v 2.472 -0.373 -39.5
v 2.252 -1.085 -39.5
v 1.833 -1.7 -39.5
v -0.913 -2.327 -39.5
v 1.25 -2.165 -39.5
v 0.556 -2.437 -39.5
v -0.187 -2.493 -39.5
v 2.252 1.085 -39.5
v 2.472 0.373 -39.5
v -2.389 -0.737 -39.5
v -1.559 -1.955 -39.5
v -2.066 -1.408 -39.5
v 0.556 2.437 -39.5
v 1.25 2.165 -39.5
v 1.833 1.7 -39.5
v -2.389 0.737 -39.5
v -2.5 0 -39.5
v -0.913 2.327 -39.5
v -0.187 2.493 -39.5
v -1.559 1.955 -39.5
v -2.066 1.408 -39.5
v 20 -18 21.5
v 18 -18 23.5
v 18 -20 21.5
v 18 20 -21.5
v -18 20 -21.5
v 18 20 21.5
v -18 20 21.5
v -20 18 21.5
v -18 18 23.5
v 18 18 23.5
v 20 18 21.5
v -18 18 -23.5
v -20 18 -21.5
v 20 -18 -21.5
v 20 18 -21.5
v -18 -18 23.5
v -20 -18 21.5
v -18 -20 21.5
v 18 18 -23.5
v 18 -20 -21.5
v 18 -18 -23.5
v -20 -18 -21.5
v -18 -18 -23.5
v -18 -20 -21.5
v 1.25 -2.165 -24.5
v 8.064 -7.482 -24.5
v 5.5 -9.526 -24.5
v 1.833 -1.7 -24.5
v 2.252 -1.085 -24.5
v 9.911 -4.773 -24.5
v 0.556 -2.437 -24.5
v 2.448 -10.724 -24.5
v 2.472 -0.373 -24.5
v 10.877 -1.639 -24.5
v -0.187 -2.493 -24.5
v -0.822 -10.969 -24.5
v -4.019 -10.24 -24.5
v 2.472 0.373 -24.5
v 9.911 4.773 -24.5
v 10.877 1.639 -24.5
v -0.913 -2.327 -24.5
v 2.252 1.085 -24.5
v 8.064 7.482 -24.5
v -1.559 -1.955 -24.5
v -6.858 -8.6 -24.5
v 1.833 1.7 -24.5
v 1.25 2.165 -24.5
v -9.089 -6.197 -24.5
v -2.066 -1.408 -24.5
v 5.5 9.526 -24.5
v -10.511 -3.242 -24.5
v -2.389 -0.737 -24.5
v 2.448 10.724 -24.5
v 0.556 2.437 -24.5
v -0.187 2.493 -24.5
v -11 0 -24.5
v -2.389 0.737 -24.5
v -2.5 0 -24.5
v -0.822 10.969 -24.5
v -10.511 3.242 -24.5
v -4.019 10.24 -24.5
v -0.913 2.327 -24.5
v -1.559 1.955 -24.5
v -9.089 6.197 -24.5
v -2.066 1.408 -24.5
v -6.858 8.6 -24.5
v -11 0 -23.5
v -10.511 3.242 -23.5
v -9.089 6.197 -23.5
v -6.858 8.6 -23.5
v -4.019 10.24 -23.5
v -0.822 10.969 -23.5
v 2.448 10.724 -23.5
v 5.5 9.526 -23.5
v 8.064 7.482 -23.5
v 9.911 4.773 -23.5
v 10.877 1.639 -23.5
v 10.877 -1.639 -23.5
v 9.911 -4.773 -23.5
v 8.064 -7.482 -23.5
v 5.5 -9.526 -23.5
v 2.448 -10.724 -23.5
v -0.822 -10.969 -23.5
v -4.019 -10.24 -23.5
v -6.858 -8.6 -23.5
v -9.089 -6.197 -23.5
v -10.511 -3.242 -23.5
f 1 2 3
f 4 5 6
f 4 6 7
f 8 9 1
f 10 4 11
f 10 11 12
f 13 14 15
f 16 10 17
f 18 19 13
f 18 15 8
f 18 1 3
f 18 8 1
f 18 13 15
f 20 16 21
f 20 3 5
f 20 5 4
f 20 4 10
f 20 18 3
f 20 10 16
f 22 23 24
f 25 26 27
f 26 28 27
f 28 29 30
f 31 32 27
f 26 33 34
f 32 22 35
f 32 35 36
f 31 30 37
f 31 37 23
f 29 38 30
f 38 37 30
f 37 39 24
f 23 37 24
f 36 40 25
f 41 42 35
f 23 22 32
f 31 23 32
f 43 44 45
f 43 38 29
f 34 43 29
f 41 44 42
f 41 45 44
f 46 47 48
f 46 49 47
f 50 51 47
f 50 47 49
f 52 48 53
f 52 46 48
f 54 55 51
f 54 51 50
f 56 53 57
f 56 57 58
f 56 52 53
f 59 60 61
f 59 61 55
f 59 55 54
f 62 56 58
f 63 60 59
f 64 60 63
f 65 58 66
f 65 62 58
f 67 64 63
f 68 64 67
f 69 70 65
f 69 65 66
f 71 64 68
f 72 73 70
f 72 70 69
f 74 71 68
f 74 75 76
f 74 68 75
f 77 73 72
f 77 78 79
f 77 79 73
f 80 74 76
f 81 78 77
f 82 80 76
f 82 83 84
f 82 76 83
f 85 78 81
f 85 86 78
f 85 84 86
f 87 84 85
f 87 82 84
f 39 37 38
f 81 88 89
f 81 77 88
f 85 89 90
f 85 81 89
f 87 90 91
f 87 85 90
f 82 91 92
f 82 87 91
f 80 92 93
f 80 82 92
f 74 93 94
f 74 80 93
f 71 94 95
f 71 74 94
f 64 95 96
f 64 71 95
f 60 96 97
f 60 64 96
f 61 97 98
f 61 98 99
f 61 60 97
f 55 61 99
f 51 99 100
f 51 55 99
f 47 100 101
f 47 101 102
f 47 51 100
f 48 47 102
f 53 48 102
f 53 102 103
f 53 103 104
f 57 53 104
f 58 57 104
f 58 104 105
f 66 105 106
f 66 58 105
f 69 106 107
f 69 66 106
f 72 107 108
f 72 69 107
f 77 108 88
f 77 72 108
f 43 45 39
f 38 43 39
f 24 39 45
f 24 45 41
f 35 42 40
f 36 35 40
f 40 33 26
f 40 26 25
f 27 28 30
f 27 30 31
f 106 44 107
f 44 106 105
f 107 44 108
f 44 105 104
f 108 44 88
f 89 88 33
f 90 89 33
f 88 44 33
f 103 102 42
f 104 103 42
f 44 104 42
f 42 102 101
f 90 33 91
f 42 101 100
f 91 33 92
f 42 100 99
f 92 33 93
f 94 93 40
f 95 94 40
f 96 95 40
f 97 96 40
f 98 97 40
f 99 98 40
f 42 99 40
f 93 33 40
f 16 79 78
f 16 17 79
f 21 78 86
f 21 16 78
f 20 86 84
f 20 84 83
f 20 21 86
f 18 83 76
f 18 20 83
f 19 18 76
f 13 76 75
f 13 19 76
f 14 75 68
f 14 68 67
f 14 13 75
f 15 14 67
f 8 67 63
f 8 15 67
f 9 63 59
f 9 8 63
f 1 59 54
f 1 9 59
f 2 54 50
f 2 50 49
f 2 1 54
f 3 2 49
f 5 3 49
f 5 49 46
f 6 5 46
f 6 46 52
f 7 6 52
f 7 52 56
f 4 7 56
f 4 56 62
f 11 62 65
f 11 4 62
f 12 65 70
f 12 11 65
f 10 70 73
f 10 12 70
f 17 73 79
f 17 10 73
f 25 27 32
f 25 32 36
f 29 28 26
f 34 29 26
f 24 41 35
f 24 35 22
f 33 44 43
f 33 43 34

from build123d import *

# Parameters (mm, degrees)
SKETCH1_W           = 40
SKETCH1_H           = 40
BOSS_EXTRUDE1_DEPTH = 23.5
CHAMFER1_SIZE       = 2
SKETCH2_R           = 11
BOSS_EXTRUDE2_DEPTH = 1
SKETCH3_R           = 2.5
BOSS_EXTRUDE3_DEPTH = 15


with BuildPart() as part:
    # Sketch1 → Boss-Extrude1 (new body, symmetric)
    with BuildSketch(Plane.XY):
        Rectangle(SKETCH1_W, SKETCH1_H)
    extrude(amount=BOSS_EXTRUDE1_DEPTH, both=True)

    # Chamfer1
    chamfer1_edges = [part.edges().sort_by_distance(p)[0] for p in [
        (-20, 0, 23.5),
        (0, -20, 23.5),
        (20, 0, 23.5),
        (0, -20, -23.5),
        (-20, 0, -23.5),
        (0, 20, -23.5),
        (20, 0, -23.5),
        (20, -20, 0),
        (-20, -20, 0),
        (-20, 20, 0),
        (20, 20, 0),
        (0, 20, 23.5),
    ]]
    chamfer(chamfer1_edges, length=CHAMFER1_SIZE)

    # Sketch2 → Boss-Extrude2 (add, symmetric)
    with BuildSketch(Plane(origin=(0, 0, -23.5), x_dir=(-1, 0, 0), z_dir=(0, 0, -1))):
        Circle(SKETCH2_R)
    extrude(amount=BOSS_EXTRUDE2_DEPTH, both=True)

    # Sketch3 → Boss-Extrude3 (add, symmetric)
    with BuildSketch(Plane(origin=(0, 0, -24.5), x_dir=(-1, 0, 0), z_dir=(0, 0, -1))):
        Circle(SKETCH3_R)
    extrude(amount=BOSS_EXTRUDE3_DEPTH, both=True)


solid = part.part
